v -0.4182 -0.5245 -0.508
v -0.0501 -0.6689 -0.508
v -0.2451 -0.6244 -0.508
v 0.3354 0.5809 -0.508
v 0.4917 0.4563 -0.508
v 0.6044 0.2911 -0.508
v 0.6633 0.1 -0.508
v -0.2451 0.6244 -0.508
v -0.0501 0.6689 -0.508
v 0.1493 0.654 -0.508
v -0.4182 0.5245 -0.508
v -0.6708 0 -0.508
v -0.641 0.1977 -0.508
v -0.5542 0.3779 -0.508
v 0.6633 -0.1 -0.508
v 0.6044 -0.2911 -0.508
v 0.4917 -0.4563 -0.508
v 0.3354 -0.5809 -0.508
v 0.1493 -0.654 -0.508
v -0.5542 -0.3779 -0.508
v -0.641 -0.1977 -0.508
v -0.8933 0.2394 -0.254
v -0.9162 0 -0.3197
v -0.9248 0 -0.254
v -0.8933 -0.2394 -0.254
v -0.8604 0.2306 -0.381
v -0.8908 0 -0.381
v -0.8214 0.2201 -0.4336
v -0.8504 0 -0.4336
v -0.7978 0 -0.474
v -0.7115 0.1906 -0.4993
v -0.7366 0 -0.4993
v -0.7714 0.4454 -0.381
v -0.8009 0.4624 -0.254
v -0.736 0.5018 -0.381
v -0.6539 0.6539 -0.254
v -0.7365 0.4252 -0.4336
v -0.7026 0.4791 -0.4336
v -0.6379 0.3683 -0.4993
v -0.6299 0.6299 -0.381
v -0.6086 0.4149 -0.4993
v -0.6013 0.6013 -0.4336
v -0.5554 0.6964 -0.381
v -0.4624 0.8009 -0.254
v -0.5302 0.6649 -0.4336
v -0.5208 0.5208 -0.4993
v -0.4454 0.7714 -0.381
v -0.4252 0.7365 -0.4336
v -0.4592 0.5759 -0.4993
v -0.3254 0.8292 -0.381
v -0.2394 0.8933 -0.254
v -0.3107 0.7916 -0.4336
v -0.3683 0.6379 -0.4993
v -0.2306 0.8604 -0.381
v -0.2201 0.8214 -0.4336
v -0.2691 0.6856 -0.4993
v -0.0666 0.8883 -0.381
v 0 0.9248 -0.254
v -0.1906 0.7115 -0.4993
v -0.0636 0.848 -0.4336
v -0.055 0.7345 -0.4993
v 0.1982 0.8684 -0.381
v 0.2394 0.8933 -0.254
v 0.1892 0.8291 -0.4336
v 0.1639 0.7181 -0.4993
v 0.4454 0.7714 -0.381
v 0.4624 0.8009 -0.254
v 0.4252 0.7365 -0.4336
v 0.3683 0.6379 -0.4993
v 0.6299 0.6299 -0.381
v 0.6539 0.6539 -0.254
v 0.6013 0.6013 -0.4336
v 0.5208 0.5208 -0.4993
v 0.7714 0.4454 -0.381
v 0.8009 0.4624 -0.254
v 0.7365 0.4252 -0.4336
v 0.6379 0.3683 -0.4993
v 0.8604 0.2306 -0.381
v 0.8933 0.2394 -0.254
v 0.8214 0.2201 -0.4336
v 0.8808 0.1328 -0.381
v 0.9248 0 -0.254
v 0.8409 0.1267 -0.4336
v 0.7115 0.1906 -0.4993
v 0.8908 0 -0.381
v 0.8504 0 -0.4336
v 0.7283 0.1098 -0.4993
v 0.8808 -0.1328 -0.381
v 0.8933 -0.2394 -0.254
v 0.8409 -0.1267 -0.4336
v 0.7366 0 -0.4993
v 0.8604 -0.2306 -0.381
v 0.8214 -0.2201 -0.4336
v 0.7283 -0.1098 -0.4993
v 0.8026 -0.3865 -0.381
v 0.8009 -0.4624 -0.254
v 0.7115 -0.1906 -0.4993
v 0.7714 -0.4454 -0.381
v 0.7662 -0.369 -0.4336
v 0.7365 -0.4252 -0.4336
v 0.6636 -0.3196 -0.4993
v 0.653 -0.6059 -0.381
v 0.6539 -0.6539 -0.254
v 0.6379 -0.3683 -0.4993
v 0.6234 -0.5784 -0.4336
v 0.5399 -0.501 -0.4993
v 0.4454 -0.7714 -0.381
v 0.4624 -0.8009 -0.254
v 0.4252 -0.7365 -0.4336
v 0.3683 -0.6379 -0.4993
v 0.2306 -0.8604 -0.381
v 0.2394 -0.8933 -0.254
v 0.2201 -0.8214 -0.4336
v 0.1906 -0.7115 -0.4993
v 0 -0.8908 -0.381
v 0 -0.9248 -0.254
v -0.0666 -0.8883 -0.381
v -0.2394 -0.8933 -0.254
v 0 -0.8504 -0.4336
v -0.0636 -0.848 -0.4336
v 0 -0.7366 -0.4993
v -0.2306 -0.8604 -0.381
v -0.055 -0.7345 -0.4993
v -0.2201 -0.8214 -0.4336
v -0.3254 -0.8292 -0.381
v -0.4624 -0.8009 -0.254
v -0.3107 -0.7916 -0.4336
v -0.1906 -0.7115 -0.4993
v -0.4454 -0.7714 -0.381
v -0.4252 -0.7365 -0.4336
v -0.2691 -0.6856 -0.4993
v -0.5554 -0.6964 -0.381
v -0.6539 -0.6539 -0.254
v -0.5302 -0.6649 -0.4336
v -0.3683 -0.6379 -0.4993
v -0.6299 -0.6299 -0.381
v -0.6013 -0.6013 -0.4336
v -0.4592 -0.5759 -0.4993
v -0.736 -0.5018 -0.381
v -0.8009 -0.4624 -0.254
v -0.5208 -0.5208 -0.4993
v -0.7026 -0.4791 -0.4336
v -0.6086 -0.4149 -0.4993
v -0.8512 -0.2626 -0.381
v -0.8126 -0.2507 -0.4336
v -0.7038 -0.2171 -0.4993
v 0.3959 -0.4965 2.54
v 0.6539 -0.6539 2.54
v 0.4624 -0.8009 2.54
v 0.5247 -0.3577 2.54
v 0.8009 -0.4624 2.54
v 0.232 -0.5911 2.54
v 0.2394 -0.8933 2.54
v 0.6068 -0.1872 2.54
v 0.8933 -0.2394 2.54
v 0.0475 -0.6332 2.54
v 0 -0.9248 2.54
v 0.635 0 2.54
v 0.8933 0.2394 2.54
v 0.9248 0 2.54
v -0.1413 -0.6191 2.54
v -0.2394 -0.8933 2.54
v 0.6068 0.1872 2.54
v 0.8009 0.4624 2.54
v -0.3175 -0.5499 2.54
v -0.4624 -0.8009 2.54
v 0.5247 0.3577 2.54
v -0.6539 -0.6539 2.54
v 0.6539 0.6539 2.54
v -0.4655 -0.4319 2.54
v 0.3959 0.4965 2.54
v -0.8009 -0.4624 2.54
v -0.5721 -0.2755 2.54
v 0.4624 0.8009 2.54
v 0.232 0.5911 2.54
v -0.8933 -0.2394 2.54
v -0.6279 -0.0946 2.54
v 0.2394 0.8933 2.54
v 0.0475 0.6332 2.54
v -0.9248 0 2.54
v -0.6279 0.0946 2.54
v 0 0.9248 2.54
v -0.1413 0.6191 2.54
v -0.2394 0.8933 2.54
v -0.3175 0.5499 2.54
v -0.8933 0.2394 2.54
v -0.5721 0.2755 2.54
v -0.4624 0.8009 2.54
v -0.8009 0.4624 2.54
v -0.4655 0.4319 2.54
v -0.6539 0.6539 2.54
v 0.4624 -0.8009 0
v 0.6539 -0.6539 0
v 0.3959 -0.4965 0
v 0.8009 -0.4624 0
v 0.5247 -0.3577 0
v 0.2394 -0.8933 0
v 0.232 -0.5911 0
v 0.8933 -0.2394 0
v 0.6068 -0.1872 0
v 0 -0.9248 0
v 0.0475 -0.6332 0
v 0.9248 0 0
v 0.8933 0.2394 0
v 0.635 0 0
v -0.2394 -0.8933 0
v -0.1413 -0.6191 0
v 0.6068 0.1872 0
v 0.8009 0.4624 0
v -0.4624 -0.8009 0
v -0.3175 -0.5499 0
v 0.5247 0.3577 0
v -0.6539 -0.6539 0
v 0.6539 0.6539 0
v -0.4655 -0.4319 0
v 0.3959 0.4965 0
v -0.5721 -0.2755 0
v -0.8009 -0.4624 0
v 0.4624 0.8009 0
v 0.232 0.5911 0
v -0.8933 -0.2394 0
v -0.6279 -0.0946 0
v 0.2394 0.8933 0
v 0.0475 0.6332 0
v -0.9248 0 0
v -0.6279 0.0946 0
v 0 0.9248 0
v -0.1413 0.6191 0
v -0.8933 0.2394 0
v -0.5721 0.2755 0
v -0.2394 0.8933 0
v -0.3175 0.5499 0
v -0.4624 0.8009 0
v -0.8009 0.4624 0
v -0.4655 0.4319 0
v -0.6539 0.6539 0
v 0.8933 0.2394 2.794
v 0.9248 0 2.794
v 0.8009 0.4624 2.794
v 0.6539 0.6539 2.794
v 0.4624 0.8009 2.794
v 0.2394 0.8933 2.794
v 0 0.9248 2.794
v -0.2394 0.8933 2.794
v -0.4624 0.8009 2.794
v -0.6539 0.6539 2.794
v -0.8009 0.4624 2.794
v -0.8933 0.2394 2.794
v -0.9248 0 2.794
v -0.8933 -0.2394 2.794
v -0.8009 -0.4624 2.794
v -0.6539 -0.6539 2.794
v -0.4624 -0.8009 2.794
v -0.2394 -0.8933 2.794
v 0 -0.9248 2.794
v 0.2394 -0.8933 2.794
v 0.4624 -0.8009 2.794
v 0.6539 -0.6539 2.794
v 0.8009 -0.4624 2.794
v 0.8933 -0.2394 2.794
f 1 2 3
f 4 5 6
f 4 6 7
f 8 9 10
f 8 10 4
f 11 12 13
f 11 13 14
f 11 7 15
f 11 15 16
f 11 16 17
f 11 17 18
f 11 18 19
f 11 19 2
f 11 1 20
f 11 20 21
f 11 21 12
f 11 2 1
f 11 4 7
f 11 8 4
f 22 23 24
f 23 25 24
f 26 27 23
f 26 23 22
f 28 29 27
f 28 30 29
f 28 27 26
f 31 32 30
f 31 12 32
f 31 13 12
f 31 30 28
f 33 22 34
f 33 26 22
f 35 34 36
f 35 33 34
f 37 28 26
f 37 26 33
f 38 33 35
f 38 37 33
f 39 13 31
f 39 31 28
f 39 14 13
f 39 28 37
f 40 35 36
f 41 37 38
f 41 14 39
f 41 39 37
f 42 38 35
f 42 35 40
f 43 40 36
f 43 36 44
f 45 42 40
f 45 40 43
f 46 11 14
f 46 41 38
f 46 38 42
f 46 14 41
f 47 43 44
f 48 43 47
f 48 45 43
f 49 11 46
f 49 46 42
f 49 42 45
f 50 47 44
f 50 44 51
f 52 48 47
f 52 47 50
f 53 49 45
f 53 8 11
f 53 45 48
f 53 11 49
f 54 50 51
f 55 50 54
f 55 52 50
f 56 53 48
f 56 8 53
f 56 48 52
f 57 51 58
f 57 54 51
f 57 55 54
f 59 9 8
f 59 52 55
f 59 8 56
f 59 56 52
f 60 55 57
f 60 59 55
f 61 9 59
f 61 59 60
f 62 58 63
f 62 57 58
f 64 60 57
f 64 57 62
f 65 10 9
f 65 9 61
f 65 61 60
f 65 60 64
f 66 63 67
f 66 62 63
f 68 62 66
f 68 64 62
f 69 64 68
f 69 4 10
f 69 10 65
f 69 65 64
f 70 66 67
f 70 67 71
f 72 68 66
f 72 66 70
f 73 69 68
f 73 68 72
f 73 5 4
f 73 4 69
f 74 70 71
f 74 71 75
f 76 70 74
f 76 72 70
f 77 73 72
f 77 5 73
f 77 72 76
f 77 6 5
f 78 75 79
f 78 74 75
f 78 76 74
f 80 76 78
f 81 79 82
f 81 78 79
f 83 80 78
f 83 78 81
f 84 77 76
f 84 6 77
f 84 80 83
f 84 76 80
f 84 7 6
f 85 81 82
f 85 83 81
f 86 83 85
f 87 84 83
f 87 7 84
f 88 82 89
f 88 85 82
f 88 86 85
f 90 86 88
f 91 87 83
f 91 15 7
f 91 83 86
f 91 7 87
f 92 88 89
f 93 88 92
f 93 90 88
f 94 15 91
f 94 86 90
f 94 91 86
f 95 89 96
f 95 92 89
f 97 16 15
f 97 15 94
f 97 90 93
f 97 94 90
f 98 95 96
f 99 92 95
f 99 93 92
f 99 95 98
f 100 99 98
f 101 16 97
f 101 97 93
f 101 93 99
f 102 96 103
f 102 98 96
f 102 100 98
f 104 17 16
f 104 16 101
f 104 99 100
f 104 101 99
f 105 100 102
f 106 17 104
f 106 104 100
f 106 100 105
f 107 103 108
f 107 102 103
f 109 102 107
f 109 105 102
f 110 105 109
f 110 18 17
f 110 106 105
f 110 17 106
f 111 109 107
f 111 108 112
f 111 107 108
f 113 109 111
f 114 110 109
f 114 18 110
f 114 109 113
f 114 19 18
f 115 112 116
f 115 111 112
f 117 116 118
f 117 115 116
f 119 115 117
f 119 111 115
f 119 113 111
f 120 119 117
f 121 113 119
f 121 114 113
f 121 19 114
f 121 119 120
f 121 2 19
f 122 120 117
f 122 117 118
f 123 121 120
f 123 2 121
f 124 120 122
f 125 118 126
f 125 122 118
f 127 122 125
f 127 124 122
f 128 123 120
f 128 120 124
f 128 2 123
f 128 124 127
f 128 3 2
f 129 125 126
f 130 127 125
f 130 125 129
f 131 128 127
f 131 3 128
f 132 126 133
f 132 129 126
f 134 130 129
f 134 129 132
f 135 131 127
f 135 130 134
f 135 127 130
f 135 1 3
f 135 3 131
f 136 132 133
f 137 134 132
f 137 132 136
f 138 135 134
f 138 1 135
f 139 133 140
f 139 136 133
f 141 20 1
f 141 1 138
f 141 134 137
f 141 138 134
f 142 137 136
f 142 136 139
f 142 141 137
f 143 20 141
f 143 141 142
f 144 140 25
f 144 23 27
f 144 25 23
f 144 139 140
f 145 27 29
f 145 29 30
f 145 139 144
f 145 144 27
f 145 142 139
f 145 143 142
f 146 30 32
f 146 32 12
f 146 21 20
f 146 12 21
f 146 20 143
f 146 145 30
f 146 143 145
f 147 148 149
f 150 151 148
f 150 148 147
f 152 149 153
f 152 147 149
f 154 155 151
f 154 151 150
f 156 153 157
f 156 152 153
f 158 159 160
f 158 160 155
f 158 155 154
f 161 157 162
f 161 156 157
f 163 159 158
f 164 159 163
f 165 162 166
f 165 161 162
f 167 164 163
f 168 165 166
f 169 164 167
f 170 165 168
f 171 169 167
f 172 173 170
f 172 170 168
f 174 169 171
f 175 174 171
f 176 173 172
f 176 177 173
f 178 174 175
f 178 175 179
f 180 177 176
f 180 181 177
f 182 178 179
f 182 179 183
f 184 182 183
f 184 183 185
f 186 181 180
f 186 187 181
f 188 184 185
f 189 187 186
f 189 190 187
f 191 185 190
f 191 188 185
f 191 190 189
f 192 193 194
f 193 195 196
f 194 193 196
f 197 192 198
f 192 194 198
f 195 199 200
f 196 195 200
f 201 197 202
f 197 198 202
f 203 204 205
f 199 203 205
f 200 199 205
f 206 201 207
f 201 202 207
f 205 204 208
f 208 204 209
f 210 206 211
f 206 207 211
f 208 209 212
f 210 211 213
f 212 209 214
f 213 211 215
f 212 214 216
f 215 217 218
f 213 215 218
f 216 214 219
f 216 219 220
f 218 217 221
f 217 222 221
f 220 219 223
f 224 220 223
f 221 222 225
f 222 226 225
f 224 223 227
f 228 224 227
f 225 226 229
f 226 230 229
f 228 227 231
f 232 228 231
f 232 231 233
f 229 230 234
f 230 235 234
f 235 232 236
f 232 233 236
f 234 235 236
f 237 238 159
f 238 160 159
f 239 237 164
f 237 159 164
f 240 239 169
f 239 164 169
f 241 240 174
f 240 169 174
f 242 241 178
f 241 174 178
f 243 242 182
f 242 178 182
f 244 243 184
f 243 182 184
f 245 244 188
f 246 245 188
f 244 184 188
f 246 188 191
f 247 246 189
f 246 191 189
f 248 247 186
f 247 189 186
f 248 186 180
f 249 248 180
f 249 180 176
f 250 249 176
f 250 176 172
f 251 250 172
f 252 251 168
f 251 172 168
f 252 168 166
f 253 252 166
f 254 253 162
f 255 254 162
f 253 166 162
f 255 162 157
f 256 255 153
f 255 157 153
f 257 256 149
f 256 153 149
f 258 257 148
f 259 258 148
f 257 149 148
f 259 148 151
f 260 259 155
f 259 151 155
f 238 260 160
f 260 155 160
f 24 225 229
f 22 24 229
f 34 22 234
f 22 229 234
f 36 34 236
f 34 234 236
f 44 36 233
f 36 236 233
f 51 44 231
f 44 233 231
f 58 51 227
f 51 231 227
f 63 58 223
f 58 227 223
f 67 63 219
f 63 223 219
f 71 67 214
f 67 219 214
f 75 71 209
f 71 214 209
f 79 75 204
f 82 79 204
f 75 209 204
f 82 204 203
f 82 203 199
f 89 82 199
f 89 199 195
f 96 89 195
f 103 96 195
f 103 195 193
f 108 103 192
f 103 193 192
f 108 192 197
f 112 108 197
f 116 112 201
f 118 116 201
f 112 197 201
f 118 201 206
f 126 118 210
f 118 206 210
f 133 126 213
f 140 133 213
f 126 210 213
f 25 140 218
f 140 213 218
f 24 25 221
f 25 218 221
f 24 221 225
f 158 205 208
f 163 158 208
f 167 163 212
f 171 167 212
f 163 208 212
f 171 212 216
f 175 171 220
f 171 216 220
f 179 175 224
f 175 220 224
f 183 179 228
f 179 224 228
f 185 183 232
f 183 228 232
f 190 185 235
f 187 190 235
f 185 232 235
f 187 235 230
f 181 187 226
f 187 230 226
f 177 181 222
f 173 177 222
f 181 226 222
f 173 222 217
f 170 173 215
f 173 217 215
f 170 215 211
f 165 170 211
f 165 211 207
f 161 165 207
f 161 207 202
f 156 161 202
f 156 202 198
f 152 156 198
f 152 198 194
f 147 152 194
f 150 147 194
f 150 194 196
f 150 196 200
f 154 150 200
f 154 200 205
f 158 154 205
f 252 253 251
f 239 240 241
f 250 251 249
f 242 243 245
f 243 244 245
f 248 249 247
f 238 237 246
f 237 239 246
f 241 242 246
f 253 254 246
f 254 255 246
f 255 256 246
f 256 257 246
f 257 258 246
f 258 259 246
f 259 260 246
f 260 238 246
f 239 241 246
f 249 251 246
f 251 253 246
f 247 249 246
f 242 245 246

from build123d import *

# Parameters (mm, degrees)
SKETCH1_R           = 0.635
BOSS_EXTRUDE1_DEPTH = 2.794
SKETCH3_R           = 0.924810793
BOSS_EXTRUDE2_DEPTH = 0.508
FILLET2_R           = 0.254
SKETCH4_W           = 0.289810793
SKETCH4_H           = 0.254


with BuildPart() as part:
    # Sketch1 → Boss-Extrude1 (new body)
    with BuildSketch(Plane.XY):
        Circle(SKETCH1_R)
    extrude(amount=BOSS_EXTRUDE1_DEPTH)

    # Sketch3 → Boss-Extrude2 (add)
    with BuildSketch(Plane(origin=(0, 0, 0), x_dir=(-1, 0, 0), z_dir=(0, 0, -1))):
        Circle(SKETCH3_R)
    extrude(amount=BOSS_EXTRUDE2_DEPTH)

    # Fillet2
    fillet2_edges = [part.edges().sort_by_distance(p)[0] for p in [
        (0.924810793, 0, -0.508),
    ]]
    fillet(fillet2_edges, radius=FILLET2_R)

    # Sketch4 → Revolve2 (revolve)
    with BuildSketch(Plane(origin=(0, 0, 0), x_dir=(1, 0, 0), z_dir=(0, 1, 0))):
        with Locations((0.779905397, -2.667)):
            Rectangle(SKETCH4_W, SKETCH4_H)
    revolve(axis=Axis((0, 0, -1.170141318), (0, 0, 1)))


solid = part.part
